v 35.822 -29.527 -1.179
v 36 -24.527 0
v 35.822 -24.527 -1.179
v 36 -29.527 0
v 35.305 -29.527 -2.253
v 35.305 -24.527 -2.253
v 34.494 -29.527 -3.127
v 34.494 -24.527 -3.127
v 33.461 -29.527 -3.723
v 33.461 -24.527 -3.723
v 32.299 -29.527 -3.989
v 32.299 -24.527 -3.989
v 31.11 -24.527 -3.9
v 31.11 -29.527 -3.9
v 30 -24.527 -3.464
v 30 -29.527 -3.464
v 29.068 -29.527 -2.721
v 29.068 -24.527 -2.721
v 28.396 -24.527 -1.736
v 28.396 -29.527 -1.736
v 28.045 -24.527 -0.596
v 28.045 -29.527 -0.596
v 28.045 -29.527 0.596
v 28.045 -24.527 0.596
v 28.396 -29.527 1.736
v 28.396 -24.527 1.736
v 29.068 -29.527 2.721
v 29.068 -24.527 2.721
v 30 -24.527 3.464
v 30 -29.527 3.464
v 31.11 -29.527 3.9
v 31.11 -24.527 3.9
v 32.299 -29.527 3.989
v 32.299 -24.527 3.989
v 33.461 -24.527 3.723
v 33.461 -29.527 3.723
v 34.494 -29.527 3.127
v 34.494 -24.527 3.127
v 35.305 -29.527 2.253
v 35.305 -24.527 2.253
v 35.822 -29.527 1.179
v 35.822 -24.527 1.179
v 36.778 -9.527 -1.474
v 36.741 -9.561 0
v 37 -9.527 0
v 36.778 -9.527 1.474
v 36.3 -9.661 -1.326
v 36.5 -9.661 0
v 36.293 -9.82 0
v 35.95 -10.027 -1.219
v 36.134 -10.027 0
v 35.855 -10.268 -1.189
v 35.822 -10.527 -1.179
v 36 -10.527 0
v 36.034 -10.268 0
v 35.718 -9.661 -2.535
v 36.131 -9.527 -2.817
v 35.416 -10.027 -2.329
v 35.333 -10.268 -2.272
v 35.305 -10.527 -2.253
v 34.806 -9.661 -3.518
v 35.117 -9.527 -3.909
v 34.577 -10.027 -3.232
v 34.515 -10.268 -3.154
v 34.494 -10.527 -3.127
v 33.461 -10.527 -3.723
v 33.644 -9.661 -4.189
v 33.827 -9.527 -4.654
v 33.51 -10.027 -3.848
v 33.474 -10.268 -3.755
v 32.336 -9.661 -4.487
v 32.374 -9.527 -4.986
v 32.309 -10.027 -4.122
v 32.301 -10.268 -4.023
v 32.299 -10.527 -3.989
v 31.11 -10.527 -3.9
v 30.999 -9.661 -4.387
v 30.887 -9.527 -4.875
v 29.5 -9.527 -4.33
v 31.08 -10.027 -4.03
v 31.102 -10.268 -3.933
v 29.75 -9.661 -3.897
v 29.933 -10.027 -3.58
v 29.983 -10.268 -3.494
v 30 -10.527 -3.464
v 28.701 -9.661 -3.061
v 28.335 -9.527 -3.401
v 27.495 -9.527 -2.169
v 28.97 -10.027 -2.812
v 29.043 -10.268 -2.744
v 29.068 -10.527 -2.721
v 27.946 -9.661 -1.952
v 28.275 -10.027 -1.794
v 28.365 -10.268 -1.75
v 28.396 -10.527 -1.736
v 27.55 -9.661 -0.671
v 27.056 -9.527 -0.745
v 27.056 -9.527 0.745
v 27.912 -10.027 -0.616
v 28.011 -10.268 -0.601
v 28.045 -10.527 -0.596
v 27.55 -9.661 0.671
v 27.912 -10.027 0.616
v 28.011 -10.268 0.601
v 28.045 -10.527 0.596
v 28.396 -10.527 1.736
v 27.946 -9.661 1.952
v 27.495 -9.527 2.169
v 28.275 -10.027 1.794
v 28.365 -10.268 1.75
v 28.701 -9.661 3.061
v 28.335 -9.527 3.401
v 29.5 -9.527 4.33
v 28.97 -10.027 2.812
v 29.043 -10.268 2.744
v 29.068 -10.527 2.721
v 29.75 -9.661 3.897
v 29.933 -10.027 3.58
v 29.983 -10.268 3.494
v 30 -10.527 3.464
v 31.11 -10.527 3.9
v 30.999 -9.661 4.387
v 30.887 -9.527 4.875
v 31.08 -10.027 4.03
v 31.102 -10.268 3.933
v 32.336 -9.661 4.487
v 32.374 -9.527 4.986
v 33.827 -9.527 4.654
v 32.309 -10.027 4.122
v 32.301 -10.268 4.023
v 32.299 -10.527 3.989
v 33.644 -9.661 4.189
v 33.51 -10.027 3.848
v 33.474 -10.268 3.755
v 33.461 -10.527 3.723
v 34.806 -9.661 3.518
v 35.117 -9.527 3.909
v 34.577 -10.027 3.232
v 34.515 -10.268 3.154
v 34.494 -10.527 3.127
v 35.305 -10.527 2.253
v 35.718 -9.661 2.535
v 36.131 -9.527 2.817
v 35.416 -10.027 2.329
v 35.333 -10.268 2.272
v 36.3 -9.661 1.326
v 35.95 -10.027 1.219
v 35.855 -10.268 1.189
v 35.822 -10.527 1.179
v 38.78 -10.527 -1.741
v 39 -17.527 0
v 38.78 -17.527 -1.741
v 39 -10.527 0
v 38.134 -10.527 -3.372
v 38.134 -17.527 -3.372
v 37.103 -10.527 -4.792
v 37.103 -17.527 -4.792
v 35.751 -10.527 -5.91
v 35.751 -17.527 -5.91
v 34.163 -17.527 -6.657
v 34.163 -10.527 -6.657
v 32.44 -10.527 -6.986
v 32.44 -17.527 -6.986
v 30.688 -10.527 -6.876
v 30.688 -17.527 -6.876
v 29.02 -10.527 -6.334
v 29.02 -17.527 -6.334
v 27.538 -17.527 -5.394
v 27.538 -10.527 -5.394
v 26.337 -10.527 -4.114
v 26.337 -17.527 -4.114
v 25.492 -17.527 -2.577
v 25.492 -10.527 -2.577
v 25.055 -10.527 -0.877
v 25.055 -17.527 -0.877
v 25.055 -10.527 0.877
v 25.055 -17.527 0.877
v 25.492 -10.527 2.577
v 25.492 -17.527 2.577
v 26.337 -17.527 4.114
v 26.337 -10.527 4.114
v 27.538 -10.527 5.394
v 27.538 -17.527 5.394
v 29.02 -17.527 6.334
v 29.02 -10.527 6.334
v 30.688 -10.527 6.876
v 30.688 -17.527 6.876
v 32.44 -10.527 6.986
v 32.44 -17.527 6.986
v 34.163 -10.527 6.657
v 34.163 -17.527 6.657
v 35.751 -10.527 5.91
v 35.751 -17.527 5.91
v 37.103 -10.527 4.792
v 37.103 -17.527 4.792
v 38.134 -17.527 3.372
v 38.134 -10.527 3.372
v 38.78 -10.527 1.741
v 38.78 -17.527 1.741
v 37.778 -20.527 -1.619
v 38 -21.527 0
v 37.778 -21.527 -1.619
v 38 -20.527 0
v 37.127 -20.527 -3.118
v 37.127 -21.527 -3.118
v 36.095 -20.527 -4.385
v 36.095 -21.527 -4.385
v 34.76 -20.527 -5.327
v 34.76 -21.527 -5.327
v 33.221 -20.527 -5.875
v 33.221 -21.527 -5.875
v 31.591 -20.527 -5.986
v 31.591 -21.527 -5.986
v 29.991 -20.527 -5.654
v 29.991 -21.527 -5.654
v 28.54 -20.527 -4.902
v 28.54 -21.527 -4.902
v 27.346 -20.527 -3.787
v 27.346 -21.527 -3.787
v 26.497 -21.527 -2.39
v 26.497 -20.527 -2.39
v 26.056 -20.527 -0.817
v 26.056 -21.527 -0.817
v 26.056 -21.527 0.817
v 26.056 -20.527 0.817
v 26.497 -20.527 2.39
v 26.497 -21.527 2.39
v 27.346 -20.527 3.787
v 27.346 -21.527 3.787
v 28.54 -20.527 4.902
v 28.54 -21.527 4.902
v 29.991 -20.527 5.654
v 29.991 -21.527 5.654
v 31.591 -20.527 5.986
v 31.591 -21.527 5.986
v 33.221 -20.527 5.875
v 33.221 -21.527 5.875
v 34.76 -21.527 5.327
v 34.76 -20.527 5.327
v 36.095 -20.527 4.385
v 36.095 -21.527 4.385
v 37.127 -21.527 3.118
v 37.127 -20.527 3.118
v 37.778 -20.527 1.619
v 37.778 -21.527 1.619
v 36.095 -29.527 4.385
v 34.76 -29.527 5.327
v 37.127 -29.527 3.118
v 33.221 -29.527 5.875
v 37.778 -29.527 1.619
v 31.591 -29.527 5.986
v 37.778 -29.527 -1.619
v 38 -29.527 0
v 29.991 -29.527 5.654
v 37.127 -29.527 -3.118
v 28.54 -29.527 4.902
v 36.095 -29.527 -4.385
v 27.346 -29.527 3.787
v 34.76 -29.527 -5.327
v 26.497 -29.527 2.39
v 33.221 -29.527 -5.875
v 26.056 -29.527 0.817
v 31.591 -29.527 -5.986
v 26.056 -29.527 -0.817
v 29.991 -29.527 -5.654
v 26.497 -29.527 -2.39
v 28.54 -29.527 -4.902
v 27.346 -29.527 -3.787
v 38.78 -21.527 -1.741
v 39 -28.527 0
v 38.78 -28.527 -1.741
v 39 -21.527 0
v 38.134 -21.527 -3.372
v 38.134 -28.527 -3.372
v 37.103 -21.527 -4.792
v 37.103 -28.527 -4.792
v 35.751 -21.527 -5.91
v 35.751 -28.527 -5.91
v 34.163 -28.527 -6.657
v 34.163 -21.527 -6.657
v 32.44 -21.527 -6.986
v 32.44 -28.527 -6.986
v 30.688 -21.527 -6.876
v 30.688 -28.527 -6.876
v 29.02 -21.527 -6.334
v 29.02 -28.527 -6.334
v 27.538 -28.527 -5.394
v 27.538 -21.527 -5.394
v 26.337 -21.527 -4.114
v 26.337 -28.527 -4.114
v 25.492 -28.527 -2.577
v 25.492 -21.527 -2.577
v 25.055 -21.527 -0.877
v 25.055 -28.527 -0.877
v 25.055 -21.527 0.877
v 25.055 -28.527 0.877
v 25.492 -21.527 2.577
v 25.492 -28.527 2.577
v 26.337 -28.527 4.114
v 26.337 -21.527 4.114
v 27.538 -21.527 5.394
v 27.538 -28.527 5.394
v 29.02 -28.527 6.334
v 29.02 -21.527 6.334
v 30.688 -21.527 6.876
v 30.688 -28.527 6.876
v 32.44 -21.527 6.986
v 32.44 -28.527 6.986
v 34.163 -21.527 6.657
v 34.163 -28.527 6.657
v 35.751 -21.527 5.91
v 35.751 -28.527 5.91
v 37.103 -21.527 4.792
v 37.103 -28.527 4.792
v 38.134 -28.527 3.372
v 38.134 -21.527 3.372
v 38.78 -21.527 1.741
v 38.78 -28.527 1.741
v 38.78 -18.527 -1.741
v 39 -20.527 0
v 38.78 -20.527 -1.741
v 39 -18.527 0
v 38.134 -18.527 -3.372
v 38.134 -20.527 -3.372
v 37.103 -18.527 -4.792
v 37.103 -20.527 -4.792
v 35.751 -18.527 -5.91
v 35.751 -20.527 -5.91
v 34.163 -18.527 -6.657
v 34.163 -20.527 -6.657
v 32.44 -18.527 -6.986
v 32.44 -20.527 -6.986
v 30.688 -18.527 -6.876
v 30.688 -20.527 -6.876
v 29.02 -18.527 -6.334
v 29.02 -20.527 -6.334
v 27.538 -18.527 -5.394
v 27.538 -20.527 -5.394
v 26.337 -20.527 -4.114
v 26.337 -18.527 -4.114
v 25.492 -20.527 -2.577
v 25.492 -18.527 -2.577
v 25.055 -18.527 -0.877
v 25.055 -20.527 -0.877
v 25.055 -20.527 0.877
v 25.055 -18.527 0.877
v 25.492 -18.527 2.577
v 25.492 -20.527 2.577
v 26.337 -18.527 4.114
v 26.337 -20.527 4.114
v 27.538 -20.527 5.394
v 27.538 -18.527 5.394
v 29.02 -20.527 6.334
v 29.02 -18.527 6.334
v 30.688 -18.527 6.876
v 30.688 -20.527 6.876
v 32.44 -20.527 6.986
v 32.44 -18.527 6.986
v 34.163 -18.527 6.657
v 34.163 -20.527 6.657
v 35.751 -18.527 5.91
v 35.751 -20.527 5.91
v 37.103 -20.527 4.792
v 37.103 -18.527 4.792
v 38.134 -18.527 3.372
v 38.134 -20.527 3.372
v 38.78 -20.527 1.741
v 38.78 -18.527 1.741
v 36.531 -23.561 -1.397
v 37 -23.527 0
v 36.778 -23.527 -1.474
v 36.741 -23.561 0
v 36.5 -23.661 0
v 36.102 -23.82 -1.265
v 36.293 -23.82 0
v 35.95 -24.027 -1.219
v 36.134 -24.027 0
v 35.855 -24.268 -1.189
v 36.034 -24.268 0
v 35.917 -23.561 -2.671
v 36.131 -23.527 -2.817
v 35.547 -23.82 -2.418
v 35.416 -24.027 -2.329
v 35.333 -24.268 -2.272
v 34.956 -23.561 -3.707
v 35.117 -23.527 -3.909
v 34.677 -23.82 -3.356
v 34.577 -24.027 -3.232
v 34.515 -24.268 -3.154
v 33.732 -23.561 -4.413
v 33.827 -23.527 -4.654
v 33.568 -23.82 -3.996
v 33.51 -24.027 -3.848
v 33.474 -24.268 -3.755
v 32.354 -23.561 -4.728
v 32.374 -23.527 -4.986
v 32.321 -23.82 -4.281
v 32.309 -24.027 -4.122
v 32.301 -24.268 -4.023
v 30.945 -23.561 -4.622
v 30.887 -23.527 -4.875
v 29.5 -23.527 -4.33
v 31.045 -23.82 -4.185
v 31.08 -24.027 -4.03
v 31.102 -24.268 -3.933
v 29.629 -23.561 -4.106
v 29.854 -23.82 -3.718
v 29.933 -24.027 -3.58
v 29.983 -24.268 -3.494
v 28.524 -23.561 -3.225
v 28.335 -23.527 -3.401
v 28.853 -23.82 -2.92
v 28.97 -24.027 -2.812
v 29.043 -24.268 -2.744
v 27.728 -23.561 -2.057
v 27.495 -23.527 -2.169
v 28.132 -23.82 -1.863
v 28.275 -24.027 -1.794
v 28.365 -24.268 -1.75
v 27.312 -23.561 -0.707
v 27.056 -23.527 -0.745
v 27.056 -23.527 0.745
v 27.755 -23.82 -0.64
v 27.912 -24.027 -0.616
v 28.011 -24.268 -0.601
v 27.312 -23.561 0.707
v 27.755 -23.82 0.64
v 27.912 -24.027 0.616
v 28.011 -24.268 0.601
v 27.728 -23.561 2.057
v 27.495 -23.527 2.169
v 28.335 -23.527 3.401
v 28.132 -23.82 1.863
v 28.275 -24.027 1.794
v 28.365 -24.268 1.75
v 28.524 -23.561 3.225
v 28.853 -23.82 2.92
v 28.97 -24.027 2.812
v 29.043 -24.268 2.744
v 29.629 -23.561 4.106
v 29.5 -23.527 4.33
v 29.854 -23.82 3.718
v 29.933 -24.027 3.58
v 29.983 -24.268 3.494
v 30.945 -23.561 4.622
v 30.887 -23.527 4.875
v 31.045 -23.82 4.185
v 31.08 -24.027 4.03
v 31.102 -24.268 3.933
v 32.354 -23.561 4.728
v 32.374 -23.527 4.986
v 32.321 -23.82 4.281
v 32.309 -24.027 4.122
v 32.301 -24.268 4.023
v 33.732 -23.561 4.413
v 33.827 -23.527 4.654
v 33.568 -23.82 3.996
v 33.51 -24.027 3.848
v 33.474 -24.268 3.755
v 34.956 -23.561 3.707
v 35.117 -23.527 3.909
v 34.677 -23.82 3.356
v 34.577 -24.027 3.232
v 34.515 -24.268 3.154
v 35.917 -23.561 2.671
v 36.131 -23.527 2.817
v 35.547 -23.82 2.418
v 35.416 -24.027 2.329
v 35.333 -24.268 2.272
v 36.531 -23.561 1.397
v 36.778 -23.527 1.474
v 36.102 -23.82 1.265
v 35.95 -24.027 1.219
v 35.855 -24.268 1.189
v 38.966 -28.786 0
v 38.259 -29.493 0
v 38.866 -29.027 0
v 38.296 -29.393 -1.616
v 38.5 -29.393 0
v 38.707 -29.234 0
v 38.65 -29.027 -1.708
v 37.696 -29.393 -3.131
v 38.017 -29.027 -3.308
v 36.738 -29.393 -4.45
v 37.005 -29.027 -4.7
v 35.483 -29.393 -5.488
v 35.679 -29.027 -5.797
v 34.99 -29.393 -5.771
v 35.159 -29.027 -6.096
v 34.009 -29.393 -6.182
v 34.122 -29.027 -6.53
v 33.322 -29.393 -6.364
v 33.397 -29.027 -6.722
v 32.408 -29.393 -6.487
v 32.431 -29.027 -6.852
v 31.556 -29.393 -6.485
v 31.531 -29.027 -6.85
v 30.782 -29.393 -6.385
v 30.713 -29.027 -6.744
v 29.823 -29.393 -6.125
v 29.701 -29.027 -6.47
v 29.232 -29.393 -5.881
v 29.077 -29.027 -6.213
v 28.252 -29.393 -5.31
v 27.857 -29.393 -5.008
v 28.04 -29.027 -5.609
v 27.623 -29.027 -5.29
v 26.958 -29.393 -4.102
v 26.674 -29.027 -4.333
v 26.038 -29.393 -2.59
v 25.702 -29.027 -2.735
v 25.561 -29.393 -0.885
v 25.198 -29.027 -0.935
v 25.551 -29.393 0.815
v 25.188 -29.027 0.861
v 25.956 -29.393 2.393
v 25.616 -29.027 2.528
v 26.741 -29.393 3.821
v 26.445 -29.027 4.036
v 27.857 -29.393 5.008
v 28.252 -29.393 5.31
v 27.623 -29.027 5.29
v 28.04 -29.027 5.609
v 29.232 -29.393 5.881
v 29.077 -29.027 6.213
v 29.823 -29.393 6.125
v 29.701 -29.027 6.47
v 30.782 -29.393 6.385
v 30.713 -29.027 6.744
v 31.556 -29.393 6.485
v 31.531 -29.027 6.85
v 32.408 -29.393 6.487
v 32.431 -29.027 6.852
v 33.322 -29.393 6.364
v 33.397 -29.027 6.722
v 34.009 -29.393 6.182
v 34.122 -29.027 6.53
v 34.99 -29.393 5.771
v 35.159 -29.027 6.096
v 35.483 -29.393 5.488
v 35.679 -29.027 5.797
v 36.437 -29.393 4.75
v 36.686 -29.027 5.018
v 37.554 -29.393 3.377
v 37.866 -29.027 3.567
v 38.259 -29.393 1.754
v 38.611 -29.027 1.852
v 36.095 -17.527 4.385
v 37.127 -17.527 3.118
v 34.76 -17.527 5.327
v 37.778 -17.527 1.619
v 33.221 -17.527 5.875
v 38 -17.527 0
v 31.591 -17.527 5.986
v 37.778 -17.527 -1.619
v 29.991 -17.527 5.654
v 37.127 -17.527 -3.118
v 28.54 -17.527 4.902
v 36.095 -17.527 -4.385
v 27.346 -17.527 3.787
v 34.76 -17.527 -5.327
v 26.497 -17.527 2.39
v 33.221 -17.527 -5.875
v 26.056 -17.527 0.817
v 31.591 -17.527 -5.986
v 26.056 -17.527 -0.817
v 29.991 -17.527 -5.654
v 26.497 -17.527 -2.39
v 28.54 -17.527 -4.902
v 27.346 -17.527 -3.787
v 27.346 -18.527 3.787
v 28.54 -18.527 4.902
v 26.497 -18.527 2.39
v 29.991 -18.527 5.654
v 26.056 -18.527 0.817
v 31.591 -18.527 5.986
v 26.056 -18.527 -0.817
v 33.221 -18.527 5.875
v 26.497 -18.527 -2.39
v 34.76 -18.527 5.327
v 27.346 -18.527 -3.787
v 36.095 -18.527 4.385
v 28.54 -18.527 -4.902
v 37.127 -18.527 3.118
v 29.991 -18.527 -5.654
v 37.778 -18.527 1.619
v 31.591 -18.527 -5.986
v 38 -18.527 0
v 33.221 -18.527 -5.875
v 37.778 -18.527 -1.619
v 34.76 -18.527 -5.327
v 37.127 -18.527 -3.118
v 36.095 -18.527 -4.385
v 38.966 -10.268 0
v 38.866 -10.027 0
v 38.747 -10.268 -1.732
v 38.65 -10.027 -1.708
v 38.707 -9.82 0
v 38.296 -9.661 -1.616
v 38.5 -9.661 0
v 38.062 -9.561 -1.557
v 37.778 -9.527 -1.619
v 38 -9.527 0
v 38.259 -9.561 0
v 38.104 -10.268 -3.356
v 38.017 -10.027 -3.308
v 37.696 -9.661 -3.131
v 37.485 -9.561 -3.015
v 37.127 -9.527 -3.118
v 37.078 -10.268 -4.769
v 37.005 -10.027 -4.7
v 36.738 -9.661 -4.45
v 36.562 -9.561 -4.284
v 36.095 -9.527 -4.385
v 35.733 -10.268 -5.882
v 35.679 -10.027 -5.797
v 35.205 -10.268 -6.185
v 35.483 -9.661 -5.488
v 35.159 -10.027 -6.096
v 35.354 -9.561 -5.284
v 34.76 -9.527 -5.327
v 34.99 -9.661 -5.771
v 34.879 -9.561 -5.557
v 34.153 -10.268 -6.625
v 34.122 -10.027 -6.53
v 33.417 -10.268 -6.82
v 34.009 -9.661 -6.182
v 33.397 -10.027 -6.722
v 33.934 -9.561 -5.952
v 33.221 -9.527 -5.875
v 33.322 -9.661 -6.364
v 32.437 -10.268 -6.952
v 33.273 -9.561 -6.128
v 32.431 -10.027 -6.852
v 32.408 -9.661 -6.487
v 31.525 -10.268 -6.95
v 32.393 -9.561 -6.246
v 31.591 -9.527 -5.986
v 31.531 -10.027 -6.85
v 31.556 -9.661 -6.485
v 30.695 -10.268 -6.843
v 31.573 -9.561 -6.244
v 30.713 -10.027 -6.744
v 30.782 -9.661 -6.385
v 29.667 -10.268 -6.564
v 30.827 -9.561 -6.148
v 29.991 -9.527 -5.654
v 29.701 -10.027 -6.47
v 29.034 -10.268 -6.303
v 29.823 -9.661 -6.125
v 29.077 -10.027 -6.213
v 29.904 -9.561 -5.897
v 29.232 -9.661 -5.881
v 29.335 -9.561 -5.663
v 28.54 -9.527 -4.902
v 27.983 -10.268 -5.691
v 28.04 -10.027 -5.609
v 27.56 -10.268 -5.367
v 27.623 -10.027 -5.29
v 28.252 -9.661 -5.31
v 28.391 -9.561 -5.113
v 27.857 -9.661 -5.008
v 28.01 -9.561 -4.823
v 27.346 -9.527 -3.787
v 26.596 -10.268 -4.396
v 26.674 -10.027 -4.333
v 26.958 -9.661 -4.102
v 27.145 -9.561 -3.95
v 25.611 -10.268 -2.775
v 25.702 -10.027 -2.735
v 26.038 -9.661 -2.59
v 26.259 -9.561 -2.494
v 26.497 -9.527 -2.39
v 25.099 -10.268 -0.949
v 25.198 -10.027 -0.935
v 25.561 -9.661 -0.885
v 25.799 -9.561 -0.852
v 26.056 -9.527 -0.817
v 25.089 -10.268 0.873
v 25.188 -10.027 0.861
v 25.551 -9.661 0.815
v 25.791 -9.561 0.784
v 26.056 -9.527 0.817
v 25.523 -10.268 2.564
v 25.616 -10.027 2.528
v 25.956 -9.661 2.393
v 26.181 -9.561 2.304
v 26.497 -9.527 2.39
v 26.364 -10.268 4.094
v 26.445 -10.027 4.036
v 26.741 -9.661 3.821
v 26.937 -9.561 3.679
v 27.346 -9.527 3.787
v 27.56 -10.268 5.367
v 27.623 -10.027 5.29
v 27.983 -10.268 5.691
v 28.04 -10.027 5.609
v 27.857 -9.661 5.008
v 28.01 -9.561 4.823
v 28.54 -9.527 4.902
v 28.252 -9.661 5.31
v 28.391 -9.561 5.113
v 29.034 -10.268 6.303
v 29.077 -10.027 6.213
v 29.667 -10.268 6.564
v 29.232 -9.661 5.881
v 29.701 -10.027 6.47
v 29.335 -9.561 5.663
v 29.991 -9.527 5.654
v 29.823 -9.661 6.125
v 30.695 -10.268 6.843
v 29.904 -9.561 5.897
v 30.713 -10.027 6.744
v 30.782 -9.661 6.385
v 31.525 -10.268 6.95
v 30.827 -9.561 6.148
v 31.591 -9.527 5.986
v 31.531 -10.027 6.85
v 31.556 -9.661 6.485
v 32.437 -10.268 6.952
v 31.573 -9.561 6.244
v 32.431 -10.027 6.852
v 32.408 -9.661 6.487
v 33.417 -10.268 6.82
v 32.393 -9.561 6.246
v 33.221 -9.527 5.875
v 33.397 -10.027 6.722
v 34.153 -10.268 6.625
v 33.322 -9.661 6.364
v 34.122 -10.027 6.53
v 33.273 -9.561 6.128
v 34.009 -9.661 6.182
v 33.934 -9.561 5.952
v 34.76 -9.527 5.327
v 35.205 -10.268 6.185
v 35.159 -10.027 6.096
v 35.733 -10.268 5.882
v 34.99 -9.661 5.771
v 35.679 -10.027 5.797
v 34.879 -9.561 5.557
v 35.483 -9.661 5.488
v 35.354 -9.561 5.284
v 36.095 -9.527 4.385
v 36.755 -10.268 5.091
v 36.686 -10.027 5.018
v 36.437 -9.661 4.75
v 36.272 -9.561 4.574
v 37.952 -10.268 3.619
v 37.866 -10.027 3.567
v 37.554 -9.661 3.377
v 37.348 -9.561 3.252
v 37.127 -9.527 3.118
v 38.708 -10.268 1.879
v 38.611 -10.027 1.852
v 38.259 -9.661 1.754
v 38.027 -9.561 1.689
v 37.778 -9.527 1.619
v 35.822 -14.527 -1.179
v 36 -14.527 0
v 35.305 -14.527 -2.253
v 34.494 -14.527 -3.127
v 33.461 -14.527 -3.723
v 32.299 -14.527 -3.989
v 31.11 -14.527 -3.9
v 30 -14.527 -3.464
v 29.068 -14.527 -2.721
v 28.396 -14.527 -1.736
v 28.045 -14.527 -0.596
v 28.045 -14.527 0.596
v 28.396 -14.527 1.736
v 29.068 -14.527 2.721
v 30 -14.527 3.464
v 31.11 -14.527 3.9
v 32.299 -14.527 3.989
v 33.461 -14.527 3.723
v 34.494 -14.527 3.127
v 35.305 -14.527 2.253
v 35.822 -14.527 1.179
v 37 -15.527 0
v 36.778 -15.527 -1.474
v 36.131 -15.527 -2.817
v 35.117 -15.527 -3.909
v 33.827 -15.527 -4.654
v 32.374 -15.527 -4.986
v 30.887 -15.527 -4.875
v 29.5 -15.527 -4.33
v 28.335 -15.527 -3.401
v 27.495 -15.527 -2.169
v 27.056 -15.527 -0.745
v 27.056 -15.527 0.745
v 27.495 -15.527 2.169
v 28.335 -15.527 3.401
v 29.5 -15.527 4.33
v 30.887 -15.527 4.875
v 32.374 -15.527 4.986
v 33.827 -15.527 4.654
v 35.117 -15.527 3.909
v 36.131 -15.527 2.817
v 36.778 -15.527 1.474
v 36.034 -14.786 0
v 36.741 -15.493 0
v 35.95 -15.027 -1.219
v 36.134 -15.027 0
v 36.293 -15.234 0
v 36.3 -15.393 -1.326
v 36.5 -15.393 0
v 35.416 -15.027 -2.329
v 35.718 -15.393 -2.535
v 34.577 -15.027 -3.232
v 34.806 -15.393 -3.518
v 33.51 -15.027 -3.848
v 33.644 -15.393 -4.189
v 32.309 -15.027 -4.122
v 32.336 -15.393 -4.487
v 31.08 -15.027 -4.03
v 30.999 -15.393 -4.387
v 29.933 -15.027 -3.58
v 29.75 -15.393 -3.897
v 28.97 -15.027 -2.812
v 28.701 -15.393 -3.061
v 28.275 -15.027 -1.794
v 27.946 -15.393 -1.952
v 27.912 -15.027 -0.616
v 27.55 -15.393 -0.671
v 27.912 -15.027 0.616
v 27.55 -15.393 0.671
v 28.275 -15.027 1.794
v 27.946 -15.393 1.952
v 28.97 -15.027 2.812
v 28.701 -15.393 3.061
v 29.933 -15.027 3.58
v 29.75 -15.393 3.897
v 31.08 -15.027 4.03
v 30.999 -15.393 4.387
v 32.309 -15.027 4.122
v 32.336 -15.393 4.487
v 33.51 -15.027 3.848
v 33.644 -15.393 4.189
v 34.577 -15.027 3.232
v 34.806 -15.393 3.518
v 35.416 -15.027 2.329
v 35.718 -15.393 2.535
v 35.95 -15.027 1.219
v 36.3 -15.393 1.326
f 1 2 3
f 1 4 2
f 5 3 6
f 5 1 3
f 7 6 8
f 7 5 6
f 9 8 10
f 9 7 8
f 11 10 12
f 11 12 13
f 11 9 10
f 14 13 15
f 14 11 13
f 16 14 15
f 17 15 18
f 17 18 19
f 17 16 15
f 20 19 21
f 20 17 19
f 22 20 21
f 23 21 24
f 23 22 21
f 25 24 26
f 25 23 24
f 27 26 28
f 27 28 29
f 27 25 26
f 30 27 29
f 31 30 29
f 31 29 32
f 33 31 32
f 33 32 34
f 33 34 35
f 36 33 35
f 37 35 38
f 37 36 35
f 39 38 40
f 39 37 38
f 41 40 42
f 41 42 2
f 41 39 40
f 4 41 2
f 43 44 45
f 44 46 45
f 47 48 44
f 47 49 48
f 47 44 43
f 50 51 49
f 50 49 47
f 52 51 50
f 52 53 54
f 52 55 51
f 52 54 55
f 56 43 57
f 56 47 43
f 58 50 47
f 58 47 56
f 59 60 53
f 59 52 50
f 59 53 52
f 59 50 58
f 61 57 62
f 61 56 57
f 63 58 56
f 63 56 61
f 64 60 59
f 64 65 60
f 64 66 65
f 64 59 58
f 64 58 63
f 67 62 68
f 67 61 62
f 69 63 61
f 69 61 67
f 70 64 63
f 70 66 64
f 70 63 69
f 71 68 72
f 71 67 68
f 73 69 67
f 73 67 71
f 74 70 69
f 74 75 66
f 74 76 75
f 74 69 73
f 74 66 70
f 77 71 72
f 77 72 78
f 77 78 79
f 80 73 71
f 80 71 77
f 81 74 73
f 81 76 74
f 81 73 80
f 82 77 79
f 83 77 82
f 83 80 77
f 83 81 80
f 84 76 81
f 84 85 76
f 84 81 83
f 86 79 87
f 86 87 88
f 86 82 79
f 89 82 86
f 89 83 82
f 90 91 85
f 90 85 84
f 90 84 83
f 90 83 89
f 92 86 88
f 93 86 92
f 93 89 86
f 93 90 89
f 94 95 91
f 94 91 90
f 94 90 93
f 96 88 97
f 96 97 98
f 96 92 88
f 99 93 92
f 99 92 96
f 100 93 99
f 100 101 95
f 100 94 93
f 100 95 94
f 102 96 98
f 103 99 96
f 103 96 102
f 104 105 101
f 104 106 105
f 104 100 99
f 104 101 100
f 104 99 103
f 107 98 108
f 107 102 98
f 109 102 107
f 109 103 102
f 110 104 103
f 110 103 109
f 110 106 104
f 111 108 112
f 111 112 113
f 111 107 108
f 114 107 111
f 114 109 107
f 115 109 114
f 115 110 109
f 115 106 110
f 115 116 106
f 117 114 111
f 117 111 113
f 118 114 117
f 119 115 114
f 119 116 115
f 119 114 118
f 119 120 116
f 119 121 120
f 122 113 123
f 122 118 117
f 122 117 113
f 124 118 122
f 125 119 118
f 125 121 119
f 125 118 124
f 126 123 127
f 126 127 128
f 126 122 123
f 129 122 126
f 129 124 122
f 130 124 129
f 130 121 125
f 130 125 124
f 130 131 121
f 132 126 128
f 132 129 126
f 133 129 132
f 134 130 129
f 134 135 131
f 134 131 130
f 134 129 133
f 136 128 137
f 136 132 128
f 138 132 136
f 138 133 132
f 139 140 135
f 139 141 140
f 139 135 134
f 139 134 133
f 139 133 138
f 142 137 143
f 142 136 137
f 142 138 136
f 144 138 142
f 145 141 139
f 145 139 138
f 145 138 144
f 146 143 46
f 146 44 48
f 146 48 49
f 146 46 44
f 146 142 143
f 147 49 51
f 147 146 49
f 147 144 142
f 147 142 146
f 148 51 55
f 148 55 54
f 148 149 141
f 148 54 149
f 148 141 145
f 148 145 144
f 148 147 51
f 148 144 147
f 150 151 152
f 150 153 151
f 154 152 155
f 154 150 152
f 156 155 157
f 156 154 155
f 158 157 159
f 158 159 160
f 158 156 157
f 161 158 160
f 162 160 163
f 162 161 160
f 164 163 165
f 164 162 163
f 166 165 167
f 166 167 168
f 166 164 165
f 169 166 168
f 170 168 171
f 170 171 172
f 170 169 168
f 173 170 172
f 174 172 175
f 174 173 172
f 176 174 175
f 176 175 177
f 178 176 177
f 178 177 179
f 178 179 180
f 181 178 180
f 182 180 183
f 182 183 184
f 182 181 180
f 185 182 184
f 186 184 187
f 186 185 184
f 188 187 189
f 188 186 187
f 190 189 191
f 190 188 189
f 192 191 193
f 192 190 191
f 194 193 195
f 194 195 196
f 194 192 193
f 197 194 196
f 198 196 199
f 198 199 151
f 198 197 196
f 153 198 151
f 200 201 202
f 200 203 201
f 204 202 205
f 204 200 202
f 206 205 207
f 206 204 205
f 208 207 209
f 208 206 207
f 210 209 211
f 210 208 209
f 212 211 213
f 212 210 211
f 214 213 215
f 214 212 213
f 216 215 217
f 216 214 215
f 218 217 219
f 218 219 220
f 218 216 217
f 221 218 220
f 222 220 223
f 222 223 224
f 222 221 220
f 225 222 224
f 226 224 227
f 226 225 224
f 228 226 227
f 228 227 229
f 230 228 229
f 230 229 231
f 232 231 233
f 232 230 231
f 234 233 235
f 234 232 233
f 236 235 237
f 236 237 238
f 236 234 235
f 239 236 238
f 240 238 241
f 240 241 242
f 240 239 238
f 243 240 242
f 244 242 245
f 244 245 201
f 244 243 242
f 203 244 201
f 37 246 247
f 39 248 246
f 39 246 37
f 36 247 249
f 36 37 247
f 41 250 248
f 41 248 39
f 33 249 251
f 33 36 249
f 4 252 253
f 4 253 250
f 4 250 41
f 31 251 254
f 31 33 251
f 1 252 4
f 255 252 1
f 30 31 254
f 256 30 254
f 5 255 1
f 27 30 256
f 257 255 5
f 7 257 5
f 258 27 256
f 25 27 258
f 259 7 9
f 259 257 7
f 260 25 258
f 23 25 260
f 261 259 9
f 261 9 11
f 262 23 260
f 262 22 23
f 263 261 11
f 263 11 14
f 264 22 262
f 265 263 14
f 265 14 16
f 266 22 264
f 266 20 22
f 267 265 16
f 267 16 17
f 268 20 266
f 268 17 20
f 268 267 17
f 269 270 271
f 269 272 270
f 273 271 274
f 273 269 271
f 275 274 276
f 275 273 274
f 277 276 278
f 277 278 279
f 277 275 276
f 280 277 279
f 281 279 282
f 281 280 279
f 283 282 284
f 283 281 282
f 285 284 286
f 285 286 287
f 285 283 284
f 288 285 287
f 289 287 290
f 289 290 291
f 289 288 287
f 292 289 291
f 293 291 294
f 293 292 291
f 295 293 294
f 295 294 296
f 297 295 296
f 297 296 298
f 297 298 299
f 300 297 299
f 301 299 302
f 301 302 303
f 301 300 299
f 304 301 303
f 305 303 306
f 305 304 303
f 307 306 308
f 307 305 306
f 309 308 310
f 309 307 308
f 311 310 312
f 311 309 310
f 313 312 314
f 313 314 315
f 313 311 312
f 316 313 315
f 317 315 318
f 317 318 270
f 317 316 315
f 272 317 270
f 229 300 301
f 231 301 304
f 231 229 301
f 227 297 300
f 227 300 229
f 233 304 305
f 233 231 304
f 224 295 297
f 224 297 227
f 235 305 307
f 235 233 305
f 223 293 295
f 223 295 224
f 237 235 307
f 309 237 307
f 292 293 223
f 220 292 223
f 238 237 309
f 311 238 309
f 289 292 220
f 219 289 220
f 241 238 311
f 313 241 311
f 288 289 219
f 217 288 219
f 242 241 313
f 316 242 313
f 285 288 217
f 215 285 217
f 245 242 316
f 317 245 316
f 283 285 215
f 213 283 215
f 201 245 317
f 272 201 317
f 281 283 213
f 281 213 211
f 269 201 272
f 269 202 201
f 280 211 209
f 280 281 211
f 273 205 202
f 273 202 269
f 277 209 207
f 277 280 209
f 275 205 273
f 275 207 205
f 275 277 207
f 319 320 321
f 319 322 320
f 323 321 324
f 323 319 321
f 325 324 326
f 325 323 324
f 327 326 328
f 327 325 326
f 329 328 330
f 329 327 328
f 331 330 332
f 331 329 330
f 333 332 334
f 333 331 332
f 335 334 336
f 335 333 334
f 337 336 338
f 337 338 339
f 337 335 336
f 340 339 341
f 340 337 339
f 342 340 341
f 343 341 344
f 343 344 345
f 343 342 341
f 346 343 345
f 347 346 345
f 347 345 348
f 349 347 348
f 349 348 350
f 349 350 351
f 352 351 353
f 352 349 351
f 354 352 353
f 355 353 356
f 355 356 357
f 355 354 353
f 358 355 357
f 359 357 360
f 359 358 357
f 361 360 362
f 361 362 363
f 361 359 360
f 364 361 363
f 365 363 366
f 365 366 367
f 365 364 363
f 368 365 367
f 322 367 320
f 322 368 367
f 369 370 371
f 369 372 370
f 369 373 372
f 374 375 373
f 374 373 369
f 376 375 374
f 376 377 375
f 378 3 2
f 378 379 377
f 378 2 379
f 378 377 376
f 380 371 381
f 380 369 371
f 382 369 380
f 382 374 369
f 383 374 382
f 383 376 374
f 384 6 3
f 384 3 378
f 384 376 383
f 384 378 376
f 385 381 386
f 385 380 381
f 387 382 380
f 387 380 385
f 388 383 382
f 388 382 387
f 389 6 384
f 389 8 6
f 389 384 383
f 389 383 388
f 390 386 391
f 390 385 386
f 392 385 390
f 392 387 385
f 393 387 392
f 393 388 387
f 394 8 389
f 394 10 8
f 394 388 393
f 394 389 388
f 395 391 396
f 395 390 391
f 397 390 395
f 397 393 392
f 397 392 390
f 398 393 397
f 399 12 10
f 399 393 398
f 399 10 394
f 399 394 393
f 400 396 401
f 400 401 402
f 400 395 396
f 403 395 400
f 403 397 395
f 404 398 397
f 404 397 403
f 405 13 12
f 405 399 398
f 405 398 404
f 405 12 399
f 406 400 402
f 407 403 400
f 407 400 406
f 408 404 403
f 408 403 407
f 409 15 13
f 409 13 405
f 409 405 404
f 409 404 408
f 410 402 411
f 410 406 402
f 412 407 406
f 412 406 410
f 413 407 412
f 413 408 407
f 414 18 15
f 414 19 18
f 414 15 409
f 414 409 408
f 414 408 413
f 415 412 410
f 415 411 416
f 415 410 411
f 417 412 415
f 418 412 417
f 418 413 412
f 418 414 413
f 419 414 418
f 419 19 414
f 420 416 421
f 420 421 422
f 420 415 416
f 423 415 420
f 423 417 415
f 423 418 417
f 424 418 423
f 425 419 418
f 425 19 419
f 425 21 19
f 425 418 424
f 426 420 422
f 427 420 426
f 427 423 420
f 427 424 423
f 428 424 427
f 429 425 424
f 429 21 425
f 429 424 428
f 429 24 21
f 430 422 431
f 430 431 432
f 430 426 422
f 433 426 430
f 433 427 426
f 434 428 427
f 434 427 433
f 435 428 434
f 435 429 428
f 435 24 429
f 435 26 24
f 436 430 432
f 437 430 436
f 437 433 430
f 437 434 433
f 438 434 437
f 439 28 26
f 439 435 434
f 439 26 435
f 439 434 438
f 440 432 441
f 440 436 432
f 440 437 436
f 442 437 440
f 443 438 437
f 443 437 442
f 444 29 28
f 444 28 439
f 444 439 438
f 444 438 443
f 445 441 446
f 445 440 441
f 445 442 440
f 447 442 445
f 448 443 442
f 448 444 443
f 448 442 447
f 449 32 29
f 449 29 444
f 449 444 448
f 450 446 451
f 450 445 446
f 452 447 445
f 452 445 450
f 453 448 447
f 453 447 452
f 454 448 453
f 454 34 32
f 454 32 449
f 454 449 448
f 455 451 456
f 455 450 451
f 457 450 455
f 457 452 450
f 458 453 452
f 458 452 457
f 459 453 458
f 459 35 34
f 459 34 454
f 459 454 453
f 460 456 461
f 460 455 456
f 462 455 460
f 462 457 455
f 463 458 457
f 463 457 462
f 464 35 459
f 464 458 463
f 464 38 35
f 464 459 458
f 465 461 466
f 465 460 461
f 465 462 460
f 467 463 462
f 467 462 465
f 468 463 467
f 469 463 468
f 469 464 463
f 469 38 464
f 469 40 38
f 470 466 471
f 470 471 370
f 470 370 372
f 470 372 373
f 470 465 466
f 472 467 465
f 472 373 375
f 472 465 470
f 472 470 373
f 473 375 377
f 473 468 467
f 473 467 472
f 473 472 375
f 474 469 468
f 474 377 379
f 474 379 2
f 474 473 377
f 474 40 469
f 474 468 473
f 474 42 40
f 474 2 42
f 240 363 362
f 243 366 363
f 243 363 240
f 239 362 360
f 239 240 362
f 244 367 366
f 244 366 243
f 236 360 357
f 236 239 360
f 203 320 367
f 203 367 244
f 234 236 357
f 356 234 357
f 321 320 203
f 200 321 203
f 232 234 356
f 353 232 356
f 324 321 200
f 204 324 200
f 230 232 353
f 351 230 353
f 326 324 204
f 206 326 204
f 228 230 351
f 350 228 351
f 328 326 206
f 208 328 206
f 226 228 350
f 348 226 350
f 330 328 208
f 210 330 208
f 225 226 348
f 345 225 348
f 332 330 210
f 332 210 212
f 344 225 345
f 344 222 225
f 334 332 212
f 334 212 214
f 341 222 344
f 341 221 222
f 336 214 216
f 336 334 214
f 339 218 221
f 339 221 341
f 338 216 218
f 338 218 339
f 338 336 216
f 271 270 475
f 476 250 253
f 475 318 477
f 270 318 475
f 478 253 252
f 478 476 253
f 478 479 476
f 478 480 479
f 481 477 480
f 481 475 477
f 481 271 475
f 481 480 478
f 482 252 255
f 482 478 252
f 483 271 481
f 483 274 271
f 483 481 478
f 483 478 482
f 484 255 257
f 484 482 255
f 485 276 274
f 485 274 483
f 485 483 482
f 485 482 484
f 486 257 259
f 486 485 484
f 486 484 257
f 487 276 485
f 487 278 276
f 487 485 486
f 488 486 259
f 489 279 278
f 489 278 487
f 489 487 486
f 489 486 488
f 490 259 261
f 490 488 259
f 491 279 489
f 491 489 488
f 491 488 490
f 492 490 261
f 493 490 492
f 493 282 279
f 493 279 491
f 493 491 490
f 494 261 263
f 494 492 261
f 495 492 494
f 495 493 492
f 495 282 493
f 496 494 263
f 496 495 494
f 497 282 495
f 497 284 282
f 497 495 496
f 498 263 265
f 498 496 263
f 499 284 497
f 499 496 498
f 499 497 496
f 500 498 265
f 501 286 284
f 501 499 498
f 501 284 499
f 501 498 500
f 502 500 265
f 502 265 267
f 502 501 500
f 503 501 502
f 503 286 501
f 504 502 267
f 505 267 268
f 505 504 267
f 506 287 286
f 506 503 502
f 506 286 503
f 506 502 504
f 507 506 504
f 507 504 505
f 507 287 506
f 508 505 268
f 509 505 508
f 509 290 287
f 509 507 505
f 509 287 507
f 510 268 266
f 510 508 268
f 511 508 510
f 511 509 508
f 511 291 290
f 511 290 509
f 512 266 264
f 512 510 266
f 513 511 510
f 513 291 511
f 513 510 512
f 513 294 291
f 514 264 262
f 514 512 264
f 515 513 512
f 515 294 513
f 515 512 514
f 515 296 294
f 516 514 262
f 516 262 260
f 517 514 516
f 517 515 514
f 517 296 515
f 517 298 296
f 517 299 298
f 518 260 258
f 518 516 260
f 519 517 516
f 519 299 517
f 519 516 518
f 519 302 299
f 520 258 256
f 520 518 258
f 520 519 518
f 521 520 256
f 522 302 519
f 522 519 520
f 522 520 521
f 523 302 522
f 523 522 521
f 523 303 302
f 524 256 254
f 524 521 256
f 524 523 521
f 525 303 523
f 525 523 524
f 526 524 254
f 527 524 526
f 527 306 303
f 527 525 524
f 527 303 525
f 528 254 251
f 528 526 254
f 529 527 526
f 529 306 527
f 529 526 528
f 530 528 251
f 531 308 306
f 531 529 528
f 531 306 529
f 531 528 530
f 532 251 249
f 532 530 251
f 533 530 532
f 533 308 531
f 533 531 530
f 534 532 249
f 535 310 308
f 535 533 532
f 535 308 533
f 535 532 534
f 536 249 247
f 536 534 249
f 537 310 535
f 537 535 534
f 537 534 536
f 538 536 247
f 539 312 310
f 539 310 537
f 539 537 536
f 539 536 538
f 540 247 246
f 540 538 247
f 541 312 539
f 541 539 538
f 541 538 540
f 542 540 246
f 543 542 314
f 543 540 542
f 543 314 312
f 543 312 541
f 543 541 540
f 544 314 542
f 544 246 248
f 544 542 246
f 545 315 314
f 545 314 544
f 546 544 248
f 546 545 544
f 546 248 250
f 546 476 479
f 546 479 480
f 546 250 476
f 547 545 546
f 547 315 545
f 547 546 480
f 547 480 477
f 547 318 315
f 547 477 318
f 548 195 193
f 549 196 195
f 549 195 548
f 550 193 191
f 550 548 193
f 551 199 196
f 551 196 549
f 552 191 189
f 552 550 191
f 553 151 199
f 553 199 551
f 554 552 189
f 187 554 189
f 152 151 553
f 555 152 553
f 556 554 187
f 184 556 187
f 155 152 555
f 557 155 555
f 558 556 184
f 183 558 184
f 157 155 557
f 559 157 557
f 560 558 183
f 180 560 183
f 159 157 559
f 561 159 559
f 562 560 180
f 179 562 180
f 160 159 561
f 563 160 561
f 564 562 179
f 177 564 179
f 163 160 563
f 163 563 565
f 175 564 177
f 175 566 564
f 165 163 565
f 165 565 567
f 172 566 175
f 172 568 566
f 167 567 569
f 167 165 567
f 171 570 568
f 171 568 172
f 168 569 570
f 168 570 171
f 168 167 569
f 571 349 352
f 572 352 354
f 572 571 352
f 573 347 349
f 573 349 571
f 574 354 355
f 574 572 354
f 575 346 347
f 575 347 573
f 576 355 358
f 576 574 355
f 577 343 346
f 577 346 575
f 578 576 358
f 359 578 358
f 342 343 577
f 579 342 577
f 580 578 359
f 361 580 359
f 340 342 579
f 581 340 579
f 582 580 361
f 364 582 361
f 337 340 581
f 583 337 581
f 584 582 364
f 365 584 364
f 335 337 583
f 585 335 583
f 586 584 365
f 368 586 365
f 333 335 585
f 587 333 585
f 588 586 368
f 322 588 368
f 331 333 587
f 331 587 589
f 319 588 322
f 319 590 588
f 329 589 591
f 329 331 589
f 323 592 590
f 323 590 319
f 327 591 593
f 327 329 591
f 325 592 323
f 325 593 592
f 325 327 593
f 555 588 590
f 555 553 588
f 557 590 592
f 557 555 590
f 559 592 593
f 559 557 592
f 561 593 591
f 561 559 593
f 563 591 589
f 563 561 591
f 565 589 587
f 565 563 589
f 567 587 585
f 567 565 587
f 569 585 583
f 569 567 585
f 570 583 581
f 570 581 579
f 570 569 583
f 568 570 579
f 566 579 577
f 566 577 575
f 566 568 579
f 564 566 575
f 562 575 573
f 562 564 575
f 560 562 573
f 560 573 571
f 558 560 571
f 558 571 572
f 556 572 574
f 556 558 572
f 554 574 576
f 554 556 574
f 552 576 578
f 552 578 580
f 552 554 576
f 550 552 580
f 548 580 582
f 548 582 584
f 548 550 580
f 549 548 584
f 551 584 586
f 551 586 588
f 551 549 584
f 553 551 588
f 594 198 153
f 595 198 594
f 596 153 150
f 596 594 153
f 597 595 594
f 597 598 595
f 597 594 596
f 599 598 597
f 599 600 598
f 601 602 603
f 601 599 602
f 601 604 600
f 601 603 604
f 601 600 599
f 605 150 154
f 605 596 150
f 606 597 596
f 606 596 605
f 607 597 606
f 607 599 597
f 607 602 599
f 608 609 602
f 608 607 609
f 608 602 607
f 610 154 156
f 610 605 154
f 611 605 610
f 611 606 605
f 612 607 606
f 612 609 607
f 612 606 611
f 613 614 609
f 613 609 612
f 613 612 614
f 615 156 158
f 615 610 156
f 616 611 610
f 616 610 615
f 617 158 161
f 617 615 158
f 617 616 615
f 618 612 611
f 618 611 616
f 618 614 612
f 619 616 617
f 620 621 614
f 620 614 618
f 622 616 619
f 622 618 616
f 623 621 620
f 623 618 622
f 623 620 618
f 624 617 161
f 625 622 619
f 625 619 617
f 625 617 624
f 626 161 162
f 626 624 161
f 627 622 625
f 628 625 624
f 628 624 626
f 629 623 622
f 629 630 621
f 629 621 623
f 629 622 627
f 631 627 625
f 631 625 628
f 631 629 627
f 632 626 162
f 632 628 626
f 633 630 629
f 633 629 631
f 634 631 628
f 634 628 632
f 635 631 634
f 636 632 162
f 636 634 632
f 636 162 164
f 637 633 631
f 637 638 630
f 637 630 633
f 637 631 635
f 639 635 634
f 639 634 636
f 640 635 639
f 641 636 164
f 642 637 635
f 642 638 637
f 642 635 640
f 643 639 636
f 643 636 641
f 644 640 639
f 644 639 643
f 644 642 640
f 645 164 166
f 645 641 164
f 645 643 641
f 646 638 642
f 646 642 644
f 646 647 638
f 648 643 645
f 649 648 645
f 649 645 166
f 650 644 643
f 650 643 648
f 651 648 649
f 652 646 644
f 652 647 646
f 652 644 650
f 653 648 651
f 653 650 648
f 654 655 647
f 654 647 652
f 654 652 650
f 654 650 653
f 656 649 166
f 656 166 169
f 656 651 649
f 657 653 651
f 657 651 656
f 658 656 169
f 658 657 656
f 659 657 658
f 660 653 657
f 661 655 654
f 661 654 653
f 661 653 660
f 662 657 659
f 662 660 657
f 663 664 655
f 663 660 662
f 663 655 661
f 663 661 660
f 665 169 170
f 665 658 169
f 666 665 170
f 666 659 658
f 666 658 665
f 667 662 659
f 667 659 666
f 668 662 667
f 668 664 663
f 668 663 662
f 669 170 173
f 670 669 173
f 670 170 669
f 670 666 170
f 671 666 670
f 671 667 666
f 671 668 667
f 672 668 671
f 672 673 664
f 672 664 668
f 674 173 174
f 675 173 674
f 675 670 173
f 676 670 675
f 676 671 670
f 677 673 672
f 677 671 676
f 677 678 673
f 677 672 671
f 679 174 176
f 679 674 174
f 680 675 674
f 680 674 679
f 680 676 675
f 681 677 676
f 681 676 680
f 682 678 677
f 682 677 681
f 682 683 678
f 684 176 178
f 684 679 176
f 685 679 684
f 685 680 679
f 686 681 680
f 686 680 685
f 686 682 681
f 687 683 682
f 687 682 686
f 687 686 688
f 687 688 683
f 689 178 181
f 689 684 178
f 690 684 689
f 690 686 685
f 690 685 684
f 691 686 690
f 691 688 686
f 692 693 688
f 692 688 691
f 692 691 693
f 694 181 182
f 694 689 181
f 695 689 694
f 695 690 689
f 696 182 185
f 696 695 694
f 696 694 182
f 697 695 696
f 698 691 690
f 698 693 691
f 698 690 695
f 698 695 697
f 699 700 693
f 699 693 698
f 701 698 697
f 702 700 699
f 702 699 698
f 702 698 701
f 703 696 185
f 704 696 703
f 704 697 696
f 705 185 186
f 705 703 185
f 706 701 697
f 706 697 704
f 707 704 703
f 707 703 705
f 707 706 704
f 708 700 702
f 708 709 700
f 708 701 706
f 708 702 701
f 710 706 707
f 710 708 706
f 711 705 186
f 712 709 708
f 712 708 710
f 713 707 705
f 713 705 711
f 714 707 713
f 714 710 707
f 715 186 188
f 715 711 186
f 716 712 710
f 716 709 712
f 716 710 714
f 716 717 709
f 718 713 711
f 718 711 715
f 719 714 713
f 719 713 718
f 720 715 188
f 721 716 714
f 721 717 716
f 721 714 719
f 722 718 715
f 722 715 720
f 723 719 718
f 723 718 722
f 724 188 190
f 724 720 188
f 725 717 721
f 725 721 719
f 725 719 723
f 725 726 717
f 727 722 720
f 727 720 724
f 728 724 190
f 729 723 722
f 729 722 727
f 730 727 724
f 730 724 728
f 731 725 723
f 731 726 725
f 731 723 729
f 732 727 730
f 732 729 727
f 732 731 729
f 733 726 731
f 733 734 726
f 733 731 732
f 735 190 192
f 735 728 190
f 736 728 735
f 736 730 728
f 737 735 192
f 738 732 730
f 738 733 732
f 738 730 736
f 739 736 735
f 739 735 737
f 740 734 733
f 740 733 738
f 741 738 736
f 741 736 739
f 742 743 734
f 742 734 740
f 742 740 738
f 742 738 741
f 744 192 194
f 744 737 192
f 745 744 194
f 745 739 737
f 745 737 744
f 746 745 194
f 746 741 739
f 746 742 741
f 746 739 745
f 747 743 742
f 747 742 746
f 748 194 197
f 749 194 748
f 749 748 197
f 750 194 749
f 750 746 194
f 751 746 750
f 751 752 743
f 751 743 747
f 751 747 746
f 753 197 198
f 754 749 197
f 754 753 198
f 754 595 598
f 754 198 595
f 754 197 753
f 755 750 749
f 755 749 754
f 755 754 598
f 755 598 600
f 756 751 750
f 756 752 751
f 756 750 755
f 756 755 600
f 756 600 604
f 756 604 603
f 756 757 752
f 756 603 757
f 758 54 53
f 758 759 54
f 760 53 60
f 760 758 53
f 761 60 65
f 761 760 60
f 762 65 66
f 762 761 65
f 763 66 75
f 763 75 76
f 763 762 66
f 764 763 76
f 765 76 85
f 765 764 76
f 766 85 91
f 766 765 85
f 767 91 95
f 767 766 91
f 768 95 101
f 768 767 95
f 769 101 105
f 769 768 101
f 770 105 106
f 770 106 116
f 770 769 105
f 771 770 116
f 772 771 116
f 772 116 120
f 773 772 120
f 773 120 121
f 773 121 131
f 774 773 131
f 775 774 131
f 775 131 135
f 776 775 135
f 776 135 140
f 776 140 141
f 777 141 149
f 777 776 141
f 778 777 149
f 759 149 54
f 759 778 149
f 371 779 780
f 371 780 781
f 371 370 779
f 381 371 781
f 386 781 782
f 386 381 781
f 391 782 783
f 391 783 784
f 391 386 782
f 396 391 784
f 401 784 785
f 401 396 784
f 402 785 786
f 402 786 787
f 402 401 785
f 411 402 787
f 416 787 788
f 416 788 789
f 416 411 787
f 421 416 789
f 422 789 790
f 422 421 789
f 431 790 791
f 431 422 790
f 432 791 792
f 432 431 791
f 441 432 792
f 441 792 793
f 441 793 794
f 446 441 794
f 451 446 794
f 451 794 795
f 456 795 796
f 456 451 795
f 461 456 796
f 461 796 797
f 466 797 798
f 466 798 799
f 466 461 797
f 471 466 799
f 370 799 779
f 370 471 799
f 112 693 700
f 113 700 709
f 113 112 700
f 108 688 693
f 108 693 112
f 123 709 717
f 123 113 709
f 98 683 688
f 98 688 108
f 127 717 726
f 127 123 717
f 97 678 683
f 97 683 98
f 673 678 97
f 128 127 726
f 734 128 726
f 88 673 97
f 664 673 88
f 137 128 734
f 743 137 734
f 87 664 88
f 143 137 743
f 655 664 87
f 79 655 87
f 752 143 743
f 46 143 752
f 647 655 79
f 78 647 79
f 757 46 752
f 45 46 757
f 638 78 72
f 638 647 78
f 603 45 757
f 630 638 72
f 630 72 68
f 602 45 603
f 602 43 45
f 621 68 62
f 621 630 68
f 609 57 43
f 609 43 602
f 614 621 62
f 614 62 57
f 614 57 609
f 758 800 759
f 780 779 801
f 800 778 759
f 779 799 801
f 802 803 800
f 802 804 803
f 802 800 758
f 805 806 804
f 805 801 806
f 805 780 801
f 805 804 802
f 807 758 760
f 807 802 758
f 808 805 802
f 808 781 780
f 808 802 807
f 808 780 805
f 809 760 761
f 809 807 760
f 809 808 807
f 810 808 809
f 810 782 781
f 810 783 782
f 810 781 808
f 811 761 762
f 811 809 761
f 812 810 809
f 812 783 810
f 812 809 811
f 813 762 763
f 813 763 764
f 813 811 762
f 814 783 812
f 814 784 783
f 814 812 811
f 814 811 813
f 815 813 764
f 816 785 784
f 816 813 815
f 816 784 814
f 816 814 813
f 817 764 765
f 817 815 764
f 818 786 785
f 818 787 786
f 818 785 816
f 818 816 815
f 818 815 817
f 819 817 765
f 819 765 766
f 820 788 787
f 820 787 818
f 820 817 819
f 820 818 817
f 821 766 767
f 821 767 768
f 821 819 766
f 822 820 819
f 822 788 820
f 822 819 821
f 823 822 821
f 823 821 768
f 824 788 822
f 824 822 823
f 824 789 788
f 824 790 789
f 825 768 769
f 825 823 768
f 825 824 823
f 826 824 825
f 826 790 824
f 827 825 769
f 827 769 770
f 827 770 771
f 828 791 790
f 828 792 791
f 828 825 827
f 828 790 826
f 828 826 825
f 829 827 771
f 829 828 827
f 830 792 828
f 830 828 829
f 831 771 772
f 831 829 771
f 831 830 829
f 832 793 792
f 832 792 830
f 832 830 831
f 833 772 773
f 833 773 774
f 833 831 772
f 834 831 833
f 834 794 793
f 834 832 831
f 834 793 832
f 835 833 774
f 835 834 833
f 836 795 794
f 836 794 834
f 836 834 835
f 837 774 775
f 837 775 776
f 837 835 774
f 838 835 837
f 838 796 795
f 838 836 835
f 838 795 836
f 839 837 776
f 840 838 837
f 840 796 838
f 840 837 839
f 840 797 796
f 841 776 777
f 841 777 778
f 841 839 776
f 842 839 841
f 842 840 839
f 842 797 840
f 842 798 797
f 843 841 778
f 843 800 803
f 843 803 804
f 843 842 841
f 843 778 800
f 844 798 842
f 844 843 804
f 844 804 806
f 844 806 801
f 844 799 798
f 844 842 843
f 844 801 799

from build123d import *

# Parameters (mm, degrees)
F0_W = 1
F0_H = 1


with BuildPart() as f1:
    # F0 (on Top) → F1 (revolve)
    with BuildSketch(Plane.XY):
        with BuildLine():
            Line((36, -22.526782), (36, -27.526782))
            Line((36, -27.526782), (38, -27.526782))
            ThreePointArc((38, -27.526782), (38.707107, -27.233889), (39, -26.526782))
            Line((39, -26.526782), (39, -21.526782))
            Line((39, -21.526782), (37, -21.526782))
            ThreePointArc((37, -21.526782), (36.292893, -21.819675), (36, -22.526782))
        make_face()
        Polygon((37, -19.526782), (37, -21.526782), (39, -21.526782), (39, -19.526782), (38, -19.526782), align=None)
        with Locations((37.5, -19.026782)):
            Rectangle(F0_W, F0_H)
        Polygon((37, -16.526782), (37, -18.526782), (38, -18.526782), (39, -18.526782), (39, -16.526782), (38, -16.526782), align=None)
        with Locations((37.5, -16.026782)):
            Rectangle(F0_W, F0_H)
        Polygon((37, -13.526782), (37, -15.526782), (38, -15.526782), (39, -15.526782), (39, -13.526782), align=None)
        with BuildLine():
            ThreePointArc((36, -12.526782), (36.292893, -13.233889), (37, -13.526782))
            Line((37, -13.526782), (39, -13.526782))
            Line((39, -13.526782), (39, -8.526782))
            ThreePointArc((39, -8.526782), (38.707107, -7.819675), (38, -7.526782))
            Line((38, -7.526782), (37, -7.526782))
            ThreePointArc((37, -7.526782), (36.292893, -7.819675), (36, -8.526782))
            Line((36, -8.526782), (36, -12.526782))
        make_face()
    revolve(axis=Axis((32, -17.526782, 0), (0, 1, 0)))


with BuildPart() as f1_1:
    # F2: moved
    add(f1.part.moved(Location((0, -2, 0))))


solid = f1_1.part
